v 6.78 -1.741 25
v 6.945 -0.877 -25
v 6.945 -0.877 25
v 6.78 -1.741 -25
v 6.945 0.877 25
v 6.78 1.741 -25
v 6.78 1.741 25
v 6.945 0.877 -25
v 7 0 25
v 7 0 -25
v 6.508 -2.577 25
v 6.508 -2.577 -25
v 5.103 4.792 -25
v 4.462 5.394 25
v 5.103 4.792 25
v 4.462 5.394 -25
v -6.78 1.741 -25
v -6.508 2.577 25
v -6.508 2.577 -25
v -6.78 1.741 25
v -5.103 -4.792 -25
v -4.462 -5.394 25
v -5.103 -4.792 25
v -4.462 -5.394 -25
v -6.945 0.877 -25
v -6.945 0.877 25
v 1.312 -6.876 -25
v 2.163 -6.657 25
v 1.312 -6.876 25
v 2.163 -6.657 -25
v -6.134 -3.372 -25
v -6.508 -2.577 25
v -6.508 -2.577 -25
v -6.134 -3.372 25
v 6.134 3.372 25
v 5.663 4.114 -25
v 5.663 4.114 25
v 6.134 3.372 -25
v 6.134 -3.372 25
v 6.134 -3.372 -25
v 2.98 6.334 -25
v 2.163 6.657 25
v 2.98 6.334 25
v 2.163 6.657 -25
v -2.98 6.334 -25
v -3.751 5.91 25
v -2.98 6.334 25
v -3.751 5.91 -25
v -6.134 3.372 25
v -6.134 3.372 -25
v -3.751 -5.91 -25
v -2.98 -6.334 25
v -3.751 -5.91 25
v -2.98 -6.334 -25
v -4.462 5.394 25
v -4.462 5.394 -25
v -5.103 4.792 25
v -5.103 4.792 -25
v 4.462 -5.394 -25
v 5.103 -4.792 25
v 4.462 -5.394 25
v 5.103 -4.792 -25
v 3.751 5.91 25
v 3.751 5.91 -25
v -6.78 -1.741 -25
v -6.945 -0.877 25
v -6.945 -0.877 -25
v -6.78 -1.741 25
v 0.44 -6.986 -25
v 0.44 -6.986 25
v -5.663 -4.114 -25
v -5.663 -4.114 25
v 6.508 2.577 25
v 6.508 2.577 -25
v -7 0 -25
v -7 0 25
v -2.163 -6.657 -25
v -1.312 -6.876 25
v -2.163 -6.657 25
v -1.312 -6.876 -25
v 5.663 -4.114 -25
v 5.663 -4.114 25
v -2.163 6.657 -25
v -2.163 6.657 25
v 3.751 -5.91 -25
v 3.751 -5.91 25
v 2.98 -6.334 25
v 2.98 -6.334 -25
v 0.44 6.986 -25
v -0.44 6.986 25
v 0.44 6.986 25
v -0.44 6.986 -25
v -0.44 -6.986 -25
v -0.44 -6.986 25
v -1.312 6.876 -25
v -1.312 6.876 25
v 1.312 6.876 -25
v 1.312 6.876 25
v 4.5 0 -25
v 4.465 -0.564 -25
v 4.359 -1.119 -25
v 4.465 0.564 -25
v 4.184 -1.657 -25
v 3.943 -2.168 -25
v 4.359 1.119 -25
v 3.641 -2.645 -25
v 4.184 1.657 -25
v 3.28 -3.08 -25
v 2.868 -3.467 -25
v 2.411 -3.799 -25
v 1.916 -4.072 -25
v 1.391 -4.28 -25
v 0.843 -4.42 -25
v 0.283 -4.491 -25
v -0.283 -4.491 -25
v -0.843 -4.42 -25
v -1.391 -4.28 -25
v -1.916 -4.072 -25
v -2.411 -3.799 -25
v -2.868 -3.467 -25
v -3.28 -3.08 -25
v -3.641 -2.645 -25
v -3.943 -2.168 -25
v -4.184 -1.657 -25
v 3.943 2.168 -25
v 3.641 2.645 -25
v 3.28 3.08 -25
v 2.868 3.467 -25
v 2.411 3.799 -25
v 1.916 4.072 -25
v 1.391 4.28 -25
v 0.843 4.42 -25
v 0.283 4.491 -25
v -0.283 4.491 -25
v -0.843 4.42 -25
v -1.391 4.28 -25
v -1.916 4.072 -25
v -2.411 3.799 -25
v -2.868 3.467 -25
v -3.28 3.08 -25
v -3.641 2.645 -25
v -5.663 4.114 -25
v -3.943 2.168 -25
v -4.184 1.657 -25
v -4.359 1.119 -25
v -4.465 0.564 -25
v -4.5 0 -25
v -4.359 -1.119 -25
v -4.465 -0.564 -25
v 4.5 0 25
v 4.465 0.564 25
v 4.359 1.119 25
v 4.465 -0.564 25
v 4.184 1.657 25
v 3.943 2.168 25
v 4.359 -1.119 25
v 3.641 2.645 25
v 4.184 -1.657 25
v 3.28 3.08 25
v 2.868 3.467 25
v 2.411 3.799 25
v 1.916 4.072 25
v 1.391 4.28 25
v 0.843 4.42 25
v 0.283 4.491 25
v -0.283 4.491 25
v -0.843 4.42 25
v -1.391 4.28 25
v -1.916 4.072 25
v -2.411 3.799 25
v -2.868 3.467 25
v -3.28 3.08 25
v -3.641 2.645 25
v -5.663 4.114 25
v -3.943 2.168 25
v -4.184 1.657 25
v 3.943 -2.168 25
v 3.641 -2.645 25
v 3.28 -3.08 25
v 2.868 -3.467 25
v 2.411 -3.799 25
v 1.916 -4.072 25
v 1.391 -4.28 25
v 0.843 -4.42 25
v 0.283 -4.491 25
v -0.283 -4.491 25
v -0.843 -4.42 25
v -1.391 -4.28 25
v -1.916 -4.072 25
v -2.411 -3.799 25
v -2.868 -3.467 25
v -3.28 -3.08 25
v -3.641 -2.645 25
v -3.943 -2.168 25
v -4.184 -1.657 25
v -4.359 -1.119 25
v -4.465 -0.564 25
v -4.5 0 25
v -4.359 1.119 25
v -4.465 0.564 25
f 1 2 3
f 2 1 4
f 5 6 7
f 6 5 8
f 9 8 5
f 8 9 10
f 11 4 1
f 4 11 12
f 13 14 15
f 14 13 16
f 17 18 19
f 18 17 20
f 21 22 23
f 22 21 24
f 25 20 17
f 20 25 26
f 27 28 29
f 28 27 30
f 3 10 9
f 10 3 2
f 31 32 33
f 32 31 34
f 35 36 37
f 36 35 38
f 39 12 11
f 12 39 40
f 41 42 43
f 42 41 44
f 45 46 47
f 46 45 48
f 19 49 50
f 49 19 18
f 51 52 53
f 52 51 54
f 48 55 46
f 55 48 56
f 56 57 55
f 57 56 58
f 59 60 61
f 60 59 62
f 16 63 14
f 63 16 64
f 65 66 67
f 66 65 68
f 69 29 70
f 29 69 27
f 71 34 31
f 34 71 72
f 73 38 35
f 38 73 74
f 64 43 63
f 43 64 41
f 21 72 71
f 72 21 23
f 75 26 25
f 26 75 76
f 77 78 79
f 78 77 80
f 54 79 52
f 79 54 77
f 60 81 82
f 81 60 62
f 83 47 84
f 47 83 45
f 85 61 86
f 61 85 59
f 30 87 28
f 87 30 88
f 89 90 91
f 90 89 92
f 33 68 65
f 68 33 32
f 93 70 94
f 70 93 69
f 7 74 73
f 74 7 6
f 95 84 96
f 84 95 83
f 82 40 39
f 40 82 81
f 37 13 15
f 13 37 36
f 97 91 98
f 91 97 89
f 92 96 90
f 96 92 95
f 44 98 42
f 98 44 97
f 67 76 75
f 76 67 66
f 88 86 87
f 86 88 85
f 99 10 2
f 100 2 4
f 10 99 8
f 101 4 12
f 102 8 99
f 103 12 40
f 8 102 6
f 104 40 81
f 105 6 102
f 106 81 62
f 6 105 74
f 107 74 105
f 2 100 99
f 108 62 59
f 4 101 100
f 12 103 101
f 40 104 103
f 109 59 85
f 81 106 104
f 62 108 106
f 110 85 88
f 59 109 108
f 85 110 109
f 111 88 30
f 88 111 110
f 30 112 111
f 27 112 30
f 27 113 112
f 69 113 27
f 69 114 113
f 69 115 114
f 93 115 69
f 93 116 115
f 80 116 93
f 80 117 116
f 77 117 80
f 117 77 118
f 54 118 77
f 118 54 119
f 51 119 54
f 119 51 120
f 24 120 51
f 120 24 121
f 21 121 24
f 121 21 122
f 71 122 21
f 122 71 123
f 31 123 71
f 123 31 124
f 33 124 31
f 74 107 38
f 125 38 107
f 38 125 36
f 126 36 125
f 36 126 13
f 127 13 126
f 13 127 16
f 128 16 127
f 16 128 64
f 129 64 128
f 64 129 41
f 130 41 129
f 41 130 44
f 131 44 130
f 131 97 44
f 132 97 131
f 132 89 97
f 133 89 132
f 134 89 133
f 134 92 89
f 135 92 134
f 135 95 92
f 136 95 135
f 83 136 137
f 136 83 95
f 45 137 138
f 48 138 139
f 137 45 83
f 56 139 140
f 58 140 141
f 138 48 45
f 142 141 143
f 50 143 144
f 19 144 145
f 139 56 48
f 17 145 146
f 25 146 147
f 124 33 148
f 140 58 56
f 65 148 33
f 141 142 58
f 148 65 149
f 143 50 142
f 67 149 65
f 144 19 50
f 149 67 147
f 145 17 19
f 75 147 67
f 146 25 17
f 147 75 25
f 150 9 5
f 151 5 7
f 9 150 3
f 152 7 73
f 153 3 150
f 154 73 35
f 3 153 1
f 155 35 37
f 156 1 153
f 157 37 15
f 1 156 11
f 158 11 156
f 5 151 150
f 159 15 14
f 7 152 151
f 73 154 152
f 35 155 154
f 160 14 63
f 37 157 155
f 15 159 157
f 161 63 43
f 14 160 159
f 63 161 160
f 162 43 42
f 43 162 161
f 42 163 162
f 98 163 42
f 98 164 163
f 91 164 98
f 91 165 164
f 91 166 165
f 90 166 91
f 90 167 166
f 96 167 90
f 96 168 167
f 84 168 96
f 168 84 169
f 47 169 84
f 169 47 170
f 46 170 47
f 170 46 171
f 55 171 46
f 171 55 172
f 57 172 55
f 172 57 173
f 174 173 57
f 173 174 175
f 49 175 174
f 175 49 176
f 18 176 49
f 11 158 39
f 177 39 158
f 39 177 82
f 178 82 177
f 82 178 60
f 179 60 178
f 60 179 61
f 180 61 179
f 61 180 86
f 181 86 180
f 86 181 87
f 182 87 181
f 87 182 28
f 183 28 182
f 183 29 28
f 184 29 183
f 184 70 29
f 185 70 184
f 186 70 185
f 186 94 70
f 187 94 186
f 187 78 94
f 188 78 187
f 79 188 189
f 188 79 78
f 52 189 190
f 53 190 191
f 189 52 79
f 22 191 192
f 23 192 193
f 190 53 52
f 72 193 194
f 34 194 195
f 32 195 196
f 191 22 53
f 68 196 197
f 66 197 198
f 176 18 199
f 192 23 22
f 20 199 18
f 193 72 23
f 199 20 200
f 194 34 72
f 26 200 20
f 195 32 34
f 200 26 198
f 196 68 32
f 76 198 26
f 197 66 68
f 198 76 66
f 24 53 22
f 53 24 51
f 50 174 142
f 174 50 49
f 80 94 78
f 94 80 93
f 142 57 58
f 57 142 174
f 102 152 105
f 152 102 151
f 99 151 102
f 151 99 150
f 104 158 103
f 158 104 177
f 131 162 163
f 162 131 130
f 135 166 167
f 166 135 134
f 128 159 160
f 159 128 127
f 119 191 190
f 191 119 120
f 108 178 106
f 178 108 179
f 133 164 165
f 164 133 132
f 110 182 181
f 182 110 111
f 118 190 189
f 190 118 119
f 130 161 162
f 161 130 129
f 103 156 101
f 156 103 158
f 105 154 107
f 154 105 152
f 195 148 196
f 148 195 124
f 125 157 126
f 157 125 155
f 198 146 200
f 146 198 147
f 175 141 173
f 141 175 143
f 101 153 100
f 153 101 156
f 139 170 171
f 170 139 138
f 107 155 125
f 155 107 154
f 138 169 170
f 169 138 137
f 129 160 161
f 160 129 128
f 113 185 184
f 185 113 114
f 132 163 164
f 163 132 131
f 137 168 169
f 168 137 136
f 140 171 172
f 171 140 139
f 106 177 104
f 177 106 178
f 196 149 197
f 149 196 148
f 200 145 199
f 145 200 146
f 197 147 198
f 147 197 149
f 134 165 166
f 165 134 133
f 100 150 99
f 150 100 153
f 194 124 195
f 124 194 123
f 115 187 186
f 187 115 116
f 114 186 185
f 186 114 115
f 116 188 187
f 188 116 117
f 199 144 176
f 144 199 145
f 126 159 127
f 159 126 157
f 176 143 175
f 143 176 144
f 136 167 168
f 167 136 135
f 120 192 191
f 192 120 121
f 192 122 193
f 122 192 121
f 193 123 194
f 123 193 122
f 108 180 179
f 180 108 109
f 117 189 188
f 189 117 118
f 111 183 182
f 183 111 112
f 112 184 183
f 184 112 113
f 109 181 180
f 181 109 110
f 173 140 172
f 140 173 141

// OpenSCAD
$fn = 50;


difference() {
	union() {
		translate(v = [0, 0, -25.0000000000]) {
			cylinder(h = 50, r = 7.0000000000);
		}
	}
	union() {
		translate(v = [0, 0, -100.0000000000]) {
			cylinder(h = 200, r = 4.5000000000);
		}
	}
}
